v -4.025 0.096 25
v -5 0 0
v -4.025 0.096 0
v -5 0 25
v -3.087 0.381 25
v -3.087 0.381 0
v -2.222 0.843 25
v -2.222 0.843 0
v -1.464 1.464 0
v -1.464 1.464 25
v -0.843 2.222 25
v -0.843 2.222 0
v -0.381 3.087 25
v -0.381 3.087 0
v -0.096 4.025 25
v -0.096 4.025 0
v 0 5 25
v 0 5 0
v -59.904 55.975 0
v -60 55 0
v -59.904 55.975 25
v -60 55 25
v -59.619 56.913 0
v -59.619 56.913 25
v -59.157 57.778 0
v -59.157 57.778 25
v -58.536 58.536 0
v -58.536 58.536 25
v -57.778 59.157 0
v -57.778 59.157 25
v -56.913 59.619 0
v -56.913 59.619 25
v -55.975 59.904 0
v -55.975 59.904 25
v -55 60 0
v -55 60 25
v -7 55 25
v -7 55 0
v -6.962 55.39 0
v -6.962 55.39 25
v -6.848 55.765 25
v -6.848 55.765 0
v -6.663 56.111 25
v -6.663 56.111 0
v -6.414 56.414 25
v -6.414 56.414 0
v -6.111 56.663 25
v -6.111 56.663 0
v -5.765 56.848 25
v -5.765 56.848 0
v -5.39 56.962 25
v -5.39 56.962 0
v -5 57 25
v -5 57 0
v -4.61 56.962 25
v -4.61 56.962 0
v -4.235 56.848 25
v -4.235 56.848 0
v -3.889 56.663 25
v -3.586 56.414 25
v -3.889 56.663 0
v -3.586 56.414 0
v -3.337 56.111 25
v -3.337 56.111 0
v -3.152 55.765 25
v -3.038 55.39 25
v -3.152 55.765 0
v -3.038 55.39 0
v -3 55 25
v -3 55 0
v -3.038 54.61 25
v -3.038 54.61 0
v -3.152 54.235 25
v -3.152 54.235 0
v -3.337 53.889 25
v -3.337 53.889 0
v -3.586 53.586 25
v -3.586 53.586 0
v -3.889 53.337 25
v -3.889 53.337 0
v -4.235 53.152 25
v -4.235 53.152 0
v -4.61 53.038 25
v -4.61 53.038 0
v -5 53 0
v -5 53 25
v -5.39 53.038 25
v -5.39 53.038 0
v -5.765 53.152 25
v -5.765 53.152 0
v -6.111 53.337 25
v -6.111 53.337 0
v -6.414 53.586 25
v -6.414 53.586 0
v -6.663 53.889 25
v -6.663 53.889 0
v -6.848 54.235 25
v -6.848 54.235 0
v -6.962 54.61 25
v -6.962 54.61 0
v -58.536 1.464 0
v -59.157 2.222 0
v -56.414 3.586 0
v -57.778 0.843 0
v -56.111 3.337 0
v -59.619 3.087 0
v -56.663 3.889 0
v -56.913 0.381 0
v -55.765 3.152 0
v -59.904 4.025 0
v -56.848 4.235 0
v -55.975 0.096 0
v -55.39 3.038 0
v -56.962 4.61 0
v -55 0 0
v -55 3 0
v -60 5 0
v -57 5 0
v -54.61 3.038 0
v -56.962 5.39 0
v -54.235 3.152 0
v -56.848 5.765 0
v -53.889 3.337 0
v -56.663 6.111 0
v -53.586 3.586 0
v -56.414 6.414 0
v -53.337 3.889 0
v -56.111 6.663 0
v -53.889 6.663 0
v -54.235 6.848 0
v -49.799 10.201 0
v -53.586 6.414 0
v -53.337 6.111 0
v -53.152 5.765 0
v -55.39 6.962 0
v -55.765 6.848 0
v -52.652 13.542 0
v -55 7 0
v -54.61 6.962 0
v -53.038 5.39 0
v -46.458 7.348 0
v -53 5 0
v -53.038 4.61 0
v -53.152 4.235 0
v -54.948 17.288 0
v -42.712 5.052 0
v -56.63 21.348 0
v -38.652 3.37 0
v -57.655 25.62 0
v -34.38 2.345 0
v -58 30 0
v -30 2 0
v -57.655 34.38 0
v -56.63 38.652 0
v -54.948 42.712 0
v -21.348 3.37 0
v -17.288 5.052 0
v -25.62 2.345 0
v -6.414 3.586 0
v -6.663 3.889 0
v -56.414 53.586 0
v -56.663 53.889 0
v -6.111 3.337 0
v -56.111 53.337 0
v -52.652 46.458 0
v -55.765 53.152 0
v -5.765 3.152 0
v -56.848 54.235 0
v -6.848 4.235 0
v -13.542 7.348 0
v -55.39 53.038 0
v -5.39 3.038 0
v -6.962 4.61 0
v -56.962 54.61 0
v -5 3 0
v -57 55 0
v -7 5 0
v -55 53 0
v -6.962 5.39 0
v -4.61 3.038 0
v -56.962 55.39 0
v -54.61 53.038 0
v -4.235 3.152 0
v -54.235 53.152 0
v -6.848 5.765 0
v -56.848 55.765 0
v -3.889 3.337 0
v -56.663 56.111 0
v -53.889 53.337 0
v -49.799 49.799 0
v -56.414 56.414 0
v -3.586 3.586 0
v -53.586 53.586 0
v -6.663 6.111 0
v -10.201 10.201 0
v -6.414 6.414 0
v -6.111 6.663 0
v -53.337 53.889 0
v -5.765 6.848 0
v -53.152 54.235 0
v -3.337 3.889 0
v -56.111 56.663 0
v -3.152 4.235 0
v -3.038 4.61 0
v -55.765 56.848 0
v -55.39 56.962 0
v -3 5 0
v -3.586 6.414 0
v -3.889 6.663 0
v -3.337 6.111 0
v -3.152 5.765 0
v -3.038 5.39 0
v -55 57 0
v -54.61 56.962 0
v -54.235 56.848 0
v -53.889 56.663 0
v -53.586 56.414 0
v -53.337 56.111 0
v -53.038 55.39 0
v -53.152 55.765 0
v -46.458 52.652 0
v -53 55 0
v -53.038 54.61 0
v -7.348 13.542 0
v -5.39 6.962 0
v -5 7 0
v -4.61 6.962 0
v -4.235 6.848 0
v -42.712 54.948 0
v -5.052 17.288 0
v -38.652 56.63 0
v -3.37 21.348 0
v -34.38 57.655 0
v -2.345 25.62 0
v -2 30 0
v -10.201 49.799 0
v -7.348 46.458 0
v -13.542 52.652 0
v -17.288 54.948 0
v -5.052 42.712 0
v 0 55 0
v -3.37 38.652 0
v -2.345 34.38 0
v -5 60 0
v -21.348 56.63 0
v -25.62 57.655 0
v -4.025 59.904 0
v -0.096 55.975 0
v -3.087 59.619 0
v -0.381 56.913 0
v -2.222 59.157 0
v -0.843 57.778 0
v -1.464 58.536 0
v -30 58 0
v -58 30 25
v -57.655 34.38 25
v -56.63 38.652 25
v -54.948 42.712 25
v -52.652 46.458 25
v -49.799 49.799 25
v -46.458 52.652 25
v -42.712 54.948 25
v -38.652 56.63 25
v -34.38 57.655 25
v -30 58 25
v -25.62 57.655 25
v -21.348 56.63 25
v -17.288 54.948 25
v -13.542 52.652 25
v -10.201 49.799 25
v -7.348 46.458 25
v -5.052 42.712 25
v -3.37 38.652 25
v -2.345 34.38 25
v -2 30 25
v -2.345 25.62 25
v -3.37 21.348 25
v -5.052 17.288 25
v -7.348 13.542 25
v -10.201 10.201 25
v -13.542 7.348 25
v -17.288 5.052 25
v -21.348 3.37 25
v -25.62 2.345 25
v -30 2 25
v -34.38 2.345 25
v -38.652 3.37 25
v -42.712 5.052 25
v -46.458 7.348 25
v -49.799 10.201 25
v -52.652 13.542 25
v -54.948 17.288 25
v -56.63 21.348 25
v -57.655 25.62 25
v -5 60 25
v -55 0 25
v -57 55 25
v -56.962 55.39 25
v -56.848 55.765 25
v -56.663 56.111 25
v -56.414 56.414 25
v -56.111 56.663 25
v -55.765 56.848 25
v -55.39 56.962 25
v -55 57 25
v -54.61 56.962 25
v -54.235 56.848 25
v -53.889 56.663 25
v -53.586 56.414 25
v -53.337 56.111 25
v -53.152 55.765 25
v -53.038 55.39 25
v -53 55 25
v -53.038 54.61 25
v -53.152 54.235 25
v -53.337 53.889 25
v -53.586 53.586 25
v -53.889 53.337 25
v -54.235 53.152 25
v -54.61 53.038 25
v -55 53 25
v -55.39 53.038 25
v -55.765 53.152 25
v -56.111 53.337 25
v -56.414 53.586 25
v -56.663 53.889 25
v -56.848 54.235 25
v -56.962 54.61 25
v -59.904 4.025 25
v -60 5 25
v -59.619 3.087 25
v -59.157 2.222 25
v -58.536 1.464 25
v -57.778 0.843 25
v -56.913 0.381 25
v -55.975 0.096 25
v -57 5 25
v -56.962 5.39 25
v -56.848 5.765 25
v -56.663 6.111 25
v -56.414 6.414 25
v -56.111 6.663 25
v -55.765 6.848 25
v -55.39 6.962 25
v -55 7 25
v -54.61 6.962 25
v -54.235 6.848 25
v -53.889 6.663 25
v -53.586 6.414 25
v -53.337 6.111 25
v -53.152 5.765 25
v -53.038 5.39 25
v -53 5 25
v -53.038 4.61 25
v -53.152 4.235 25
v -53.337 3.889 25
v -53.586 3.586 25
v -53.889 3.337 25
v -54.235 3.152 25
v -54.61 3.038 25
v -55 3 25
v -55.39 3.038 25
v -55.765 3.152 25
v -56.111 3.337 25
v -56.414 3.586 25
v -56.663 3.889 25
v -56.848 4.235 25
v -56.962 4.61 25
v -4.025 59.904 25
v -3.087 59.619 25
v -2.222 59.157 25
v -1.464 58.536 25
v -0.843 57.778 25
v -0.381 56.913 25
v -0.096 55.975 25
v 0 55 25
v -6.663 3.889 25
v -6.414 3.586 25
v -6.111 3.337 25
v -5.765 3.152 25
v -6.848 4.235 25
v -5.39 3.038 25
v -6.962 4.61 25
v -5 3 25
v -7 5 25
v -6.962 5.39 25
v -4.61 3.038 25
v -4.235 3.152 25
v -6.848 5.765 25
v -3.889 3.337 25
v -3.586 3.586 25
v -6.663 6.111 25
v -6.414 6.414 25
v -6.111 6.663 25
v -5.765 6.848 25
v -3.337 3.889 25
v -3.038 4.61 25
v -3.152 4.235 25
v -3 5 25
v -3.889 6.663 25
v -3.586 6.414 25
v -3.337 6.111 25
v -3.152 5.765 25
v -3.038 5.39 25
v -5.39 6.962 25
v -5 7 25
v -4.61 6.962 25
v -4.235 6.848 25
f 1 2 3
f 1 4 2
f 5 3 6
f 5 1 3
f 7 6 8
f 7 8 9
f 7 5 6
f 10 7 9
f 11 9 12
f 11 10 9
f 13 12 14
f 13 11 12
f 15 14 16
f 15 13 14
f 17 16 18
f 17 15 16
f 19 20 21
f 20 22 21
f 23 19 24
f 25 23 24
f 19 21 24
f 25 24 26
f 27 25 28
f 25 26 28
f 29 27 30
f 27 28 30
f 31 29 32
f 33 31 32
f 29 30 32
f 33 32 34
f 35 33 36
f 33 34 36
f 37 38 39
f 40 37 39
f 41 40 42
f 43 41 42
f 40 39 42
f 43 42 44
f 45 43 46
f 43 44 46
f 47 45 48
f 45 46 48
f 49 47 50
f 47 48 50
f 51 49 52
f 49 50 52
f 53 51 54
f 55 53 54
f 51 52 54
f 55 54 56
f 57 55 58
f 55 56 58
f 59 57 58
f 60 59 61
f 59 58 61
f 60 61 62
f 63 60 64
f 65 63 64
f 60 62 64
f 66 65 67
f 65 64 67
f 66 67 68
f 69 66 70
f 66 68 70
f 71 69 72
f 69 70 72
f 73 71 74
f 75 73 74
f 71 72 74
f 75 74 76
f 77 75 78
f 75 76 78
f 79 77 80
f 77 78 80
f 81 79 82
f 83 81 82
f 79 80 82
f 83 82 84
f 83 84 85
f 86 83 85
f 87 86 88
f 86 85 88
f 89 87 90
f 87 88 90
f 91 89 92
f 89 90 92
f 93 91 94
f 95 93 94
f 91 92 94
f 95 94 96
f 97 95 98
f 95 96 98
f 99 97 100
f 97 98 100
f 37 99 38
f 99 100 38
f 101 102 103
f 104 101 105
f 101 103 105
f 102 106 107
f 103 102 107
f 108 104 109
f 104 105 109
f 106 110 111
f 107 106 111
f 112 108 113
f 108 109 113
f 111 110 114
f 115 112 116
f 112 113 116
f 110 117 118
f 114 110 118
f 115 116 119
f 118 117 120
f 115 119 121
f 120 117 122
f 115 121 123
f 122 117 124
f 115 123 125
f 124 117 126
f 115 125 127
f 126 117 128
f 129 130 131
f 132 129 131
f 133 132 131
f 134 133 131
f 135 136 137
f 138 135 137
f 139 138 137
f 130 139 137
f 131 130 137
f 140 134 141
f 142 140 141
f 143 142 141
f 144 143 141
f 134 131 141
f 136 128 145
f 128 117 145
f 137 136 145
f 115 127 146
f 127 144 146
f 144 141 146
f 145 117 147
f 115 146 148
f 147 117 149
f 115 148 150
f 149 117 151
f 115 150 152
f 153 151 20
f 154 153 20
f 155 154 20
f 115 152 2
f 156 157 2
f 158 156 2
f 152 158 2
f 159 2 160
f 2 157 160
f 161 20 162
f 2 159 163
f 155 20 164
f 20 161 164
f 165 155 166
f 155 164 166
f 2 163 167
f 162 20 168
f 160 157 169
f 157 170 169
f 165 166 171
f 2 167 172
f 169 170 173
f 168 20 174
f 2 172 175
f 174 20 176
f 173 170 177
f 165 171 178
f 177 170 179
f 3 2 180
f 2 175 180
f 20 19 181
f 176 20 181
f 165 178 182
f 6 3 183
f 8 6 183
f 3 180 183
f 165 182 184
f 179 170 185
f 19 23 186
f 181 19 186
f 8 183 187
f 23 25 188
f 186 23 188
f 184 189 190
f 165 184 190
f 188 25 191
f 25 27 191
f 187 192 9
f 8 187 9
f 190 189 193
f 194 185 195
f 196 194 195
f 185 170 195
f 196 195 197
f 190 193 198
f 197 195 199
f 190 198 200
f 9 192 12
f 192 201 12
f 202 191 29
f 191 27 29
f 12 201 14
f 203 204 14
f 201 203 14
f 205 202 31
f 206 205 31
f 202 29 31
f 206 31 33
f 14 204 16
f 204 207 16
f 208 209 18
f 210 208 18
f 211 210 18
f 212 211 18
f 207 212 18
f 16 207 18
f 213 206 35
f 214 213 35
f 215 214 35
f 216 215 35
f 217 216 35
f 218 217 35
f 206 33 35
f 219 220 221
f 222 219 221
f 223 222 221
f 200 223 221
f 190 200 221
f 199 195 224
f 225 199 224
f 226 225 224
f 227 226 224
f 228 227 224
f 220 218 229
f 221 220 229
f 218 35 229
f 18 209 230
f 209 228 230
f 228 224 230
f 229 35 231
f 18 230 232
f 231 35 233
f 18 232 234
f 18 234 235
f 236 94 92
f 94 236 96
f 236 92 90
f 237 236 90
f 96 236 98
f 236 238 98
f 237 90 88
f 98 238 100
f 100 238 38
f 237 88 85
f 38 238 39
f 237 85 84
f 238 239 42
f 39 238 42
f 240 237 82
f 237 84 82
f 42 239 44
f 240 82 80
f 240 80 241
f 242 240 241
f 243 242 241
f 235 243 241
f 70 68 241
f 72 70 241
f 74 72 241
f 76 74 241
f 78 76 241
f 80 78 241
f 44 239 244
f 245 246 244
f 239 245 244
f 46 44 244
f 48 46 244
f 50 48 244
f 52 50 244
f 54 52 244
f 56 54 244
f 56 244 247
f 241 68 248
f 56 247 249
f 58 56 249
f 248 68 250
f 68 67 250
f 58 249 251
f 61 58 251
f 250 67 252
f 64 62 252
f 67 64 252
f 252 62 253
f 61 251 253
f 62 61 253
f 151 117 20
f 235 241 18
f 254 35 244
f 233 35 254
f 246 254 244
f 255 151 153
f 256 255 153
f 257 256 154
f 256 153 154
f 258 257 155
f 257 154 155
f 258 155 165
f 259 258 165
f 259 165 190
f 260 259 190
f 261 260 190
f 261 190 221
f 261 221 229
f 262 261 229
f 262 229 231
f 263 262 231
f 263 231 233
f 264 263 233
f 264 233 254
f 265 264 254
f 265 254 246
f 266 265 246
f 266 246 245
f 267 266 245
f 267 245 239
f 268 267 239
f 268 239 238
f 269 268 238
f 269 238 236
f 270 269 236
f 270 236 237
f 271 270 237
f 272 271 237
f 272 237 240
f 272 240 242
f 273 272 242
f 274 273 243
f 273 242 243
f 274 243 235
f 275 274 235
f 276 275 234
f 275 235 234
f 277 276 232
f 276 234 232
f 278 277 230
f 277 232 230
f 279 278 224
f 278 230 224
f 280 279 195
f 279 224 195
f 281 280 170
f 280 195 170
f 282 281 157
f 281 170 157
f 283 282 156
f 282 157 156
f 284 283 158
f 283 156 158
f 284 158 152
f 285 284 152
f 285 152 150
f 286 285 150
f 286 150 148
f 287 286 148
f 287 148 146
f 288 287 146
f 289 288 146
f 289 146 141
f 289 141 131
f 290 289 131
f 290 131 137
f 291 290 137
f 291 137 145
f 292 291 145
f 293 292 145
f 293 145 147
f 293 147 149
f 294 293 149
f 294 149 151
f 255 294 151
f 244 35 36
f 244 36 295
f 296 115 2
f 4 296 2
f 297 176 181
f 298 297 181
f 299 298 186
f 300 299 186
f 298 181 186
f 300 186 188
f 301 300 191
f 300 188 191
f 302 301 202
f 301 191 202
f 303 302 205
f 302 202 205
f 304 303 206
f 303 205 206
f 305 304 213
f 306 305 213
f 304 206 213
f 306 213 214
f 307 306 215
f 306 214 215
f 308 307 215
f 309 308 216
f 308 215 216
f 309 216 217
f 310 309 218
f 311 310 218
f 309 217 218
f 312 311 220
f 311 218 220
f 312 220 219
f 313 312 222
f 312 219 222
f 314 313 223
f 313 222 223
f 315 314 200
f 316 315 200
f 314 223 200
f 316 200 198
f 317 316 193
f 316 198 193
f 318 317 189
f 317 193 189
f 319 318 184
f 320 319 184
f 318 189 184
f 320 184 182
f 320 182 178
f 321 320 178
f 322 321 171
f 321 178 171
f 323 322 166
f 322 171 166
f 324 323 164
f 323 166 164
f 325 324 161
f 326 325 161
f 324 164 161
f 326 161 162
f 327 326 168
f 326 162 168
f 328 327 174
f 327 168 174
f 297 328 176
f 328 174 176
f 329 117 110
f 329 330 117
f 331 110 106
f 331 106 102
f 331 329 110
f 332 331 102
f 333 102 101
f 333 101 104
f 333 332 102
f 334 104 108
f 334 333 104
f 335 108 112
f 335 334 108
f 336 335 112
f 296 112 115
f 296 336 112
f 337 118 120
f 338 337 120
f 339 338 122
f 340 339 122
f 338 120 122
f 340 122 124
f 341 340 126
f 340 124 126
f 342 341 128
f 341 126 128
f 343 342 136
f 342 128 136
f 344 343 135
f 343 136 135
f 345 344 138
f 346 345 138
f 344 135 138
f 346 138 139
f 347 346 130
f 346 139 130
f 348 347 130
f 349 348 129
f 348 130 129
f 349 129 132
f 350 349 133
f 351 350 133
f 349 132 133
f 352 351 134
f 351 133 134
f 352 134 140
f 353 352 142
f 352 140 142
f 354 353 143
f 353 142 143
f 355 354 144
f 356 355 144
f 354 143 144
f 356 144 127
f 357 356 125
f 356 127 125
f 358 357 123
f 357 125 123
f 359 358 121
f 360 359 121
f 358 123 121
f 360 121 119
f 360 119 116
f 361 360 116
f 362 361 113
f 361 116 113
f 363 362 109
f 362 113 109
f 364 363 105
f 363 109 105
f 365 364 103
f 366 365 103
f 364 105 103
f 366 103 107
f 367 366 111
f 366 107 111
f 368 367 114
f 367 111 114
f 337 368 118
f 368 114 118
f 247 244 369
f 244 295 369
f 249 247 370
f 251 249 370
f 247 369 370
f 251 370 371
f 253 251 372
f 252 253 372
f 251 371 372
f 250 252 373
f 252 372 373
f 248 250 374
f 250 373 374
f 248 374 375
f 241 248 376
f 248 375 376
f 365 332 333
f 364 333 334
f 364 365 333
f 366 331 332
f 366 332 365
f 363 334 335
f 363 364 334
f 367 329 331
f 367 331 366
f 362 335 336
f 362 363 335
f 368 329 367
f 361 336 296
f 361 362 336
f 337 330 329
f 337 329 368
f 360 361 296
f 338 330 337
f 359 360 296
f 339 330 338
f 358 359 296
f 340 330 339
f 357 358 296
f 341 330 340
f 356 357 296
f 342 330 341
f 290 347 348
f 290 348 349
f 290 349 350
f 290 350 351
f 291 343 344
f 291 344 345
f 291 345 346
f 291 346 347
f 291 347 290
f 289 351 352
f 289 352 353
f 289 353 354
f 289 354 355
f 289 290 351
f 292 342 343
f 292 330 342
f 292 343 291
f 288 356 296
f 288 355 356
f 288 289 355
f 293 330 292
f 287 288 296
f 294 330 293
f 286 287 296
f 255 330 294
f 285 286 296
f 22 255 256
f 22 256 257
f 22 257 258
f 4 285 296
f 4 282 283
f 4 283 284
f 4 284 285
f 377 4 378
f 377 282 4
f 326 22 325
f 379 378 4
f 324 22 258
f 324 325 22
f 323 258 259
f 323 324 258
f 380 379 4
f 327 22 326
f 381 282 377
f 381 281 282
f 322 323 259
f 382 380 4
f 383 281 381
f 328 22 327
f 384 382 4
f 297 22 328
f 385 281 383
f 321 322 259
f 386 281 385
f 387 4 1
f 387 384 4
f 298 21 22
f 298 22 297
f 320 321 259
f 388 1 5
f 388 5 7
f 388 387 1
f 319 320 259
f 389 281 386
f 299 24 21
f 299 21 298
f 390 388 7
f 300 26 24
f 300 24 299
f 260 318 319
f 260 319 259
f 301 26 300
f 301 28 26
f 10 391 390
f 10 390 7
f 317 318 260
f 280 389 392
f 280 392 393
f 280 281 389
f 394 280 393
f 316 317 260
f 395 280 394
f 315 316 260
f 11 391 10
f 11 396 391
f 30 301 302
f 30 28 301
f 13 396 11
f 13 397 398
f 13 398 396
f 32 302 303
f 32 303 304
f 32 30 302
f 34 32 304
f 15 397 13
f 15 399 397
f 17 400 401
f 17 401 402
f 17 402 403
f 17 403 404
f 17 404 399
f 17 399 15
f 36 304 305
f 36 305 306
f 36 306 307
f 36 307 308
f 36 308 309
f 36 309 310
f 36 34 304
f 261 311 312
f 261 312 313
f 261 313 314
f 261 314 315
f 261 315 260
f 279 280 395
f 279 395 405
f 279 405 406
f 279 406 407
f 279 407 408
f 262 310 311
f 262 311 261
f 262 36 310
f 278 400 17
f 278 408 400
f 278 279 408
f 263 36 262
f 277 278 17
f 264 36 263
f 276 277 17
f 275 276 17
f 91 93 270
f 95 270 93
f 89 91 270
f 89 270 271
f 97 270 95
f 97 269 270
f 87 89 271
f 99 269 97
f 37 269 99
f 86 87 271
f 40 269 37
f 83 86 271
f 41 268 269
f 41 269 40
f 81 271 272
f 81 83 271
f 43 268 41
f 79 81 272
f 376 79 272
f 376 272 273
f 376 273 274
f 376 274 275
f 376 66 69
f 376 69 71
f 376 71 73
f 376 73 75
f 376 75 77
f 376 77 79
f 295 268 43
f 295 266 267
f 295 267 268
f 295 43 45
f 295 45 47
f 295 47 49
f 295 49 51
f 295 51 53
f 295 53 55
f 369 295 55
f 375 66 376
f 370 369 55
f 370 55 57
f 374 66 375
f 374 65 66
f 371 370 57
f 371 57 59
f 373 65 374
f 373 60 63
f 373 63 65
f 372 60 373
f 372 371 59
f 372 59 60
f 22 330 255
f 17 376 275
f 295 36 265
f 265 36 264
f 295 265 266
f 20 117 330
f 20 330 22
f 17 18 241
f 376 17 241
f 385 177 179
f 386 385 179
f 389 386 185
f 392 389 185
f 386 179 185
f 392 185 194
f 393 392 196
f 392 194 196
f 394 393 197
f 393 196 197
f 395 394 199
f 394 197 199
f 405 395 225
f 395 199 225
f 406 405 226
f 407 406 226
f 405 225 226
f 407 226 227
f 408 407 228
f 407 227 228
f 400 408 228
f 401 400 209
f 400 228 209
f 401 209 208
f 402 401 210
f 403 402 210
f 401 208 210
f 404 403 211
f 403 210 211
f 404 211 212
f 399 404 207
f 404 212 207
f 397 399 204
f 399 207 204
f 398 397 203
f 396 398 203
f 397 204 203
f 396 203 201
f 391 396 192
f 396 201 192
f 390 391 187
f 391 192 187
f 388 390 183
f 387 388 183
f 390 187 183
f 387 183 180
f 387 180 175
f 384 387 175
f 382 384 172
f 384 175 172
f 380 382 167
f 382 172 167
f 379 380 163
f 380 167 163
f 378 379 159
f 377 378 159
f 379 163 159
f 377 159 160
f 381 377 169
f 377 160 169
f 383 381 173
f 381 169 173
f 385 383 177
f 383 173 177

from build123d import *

# Parameters (mm, degrees)
ESQUISSE1_W             = 60
ESQUISSE1_H             = 60
BOSS_EXTRU_1_DEPTH      = 25
ENL_V_MAT_EXTRU_1_REACH = 90.459
ESQUISSE2_R             = 28
ESQUISSE3_R             = 2
ENL_V_MAT_EXTRU_2_DEPTH = 25
CONG_1_R                = 5


with BuildPart() as part:
    # Esquisse1 → Boss.-Extru.1 (new body)
    with BuildSketch(Plane.XY):
        with Locations((-30, 30)):
            Rectangle(ESQUISSE1_W, ESQUISSE1_H)
    extrude(amount=BOSS_EXTRU_1_DEPTH)

    # Esquisse2 → Enlèv. mat.-Extru.1 (cut, up to next)
    with BuildSketch(Plane(origin=(0, 0, 0), x_dir=(-1, 0, 0), z_dir=(0, 0, -1)), mode=Mode.PRIVATE) as enl_v_mat_extru_1_sk1:
        with Locations((30, 30)):
            Circle(ESQUISSE2_R)
    enl_v_mat_extru_1_tool1 = extrude(enl_v_mat_extru_1_sk1.sketch, amount=-ENL_V_MAT_EXTRU_1_REACH, mode=Mode.PRIVATE) & part.part
    add(enl_v_mat_extru_1_tool1.solids().sort_by_distance((-30, 30, 0))[0], mode=Mode.SUBTRACT)

    # Esquisse3 → Enlèv. mat.-Extru.2 (cut)
    with BuildSketch(Plane(origin=(0, 0, 0), x_dir=(-1, 0, 0), z_dir=(0, 0, -1))):
        with Locations((5, 55)):
            Circle(ESQUISSE3_R)
        with Locations((55, 55)):
            Circle(ESQUISSE3_R)
        with Locations((55, 5)):
            Circle(ESQUISSE3_R)
        with Locations((5, 5)):
            Circle(ESQUISSE3_R)
    extrude(amount=-ENL_V_MAT_EXTRU_2_DEPTH, mode=Mode.SUBTRACT)

    # Congé1
    cong_1_edges = [part.edges().sort_by_distance(p)[0] for p in [
        (0, 0, 12.5),
        (-60, 0, 12.5),
        (-60, 60, 12.5),
        (0, 60, 12.5),
    ]]
    fillet(cong_1_edges, radius=CONG_1_R)


solid = part.part
